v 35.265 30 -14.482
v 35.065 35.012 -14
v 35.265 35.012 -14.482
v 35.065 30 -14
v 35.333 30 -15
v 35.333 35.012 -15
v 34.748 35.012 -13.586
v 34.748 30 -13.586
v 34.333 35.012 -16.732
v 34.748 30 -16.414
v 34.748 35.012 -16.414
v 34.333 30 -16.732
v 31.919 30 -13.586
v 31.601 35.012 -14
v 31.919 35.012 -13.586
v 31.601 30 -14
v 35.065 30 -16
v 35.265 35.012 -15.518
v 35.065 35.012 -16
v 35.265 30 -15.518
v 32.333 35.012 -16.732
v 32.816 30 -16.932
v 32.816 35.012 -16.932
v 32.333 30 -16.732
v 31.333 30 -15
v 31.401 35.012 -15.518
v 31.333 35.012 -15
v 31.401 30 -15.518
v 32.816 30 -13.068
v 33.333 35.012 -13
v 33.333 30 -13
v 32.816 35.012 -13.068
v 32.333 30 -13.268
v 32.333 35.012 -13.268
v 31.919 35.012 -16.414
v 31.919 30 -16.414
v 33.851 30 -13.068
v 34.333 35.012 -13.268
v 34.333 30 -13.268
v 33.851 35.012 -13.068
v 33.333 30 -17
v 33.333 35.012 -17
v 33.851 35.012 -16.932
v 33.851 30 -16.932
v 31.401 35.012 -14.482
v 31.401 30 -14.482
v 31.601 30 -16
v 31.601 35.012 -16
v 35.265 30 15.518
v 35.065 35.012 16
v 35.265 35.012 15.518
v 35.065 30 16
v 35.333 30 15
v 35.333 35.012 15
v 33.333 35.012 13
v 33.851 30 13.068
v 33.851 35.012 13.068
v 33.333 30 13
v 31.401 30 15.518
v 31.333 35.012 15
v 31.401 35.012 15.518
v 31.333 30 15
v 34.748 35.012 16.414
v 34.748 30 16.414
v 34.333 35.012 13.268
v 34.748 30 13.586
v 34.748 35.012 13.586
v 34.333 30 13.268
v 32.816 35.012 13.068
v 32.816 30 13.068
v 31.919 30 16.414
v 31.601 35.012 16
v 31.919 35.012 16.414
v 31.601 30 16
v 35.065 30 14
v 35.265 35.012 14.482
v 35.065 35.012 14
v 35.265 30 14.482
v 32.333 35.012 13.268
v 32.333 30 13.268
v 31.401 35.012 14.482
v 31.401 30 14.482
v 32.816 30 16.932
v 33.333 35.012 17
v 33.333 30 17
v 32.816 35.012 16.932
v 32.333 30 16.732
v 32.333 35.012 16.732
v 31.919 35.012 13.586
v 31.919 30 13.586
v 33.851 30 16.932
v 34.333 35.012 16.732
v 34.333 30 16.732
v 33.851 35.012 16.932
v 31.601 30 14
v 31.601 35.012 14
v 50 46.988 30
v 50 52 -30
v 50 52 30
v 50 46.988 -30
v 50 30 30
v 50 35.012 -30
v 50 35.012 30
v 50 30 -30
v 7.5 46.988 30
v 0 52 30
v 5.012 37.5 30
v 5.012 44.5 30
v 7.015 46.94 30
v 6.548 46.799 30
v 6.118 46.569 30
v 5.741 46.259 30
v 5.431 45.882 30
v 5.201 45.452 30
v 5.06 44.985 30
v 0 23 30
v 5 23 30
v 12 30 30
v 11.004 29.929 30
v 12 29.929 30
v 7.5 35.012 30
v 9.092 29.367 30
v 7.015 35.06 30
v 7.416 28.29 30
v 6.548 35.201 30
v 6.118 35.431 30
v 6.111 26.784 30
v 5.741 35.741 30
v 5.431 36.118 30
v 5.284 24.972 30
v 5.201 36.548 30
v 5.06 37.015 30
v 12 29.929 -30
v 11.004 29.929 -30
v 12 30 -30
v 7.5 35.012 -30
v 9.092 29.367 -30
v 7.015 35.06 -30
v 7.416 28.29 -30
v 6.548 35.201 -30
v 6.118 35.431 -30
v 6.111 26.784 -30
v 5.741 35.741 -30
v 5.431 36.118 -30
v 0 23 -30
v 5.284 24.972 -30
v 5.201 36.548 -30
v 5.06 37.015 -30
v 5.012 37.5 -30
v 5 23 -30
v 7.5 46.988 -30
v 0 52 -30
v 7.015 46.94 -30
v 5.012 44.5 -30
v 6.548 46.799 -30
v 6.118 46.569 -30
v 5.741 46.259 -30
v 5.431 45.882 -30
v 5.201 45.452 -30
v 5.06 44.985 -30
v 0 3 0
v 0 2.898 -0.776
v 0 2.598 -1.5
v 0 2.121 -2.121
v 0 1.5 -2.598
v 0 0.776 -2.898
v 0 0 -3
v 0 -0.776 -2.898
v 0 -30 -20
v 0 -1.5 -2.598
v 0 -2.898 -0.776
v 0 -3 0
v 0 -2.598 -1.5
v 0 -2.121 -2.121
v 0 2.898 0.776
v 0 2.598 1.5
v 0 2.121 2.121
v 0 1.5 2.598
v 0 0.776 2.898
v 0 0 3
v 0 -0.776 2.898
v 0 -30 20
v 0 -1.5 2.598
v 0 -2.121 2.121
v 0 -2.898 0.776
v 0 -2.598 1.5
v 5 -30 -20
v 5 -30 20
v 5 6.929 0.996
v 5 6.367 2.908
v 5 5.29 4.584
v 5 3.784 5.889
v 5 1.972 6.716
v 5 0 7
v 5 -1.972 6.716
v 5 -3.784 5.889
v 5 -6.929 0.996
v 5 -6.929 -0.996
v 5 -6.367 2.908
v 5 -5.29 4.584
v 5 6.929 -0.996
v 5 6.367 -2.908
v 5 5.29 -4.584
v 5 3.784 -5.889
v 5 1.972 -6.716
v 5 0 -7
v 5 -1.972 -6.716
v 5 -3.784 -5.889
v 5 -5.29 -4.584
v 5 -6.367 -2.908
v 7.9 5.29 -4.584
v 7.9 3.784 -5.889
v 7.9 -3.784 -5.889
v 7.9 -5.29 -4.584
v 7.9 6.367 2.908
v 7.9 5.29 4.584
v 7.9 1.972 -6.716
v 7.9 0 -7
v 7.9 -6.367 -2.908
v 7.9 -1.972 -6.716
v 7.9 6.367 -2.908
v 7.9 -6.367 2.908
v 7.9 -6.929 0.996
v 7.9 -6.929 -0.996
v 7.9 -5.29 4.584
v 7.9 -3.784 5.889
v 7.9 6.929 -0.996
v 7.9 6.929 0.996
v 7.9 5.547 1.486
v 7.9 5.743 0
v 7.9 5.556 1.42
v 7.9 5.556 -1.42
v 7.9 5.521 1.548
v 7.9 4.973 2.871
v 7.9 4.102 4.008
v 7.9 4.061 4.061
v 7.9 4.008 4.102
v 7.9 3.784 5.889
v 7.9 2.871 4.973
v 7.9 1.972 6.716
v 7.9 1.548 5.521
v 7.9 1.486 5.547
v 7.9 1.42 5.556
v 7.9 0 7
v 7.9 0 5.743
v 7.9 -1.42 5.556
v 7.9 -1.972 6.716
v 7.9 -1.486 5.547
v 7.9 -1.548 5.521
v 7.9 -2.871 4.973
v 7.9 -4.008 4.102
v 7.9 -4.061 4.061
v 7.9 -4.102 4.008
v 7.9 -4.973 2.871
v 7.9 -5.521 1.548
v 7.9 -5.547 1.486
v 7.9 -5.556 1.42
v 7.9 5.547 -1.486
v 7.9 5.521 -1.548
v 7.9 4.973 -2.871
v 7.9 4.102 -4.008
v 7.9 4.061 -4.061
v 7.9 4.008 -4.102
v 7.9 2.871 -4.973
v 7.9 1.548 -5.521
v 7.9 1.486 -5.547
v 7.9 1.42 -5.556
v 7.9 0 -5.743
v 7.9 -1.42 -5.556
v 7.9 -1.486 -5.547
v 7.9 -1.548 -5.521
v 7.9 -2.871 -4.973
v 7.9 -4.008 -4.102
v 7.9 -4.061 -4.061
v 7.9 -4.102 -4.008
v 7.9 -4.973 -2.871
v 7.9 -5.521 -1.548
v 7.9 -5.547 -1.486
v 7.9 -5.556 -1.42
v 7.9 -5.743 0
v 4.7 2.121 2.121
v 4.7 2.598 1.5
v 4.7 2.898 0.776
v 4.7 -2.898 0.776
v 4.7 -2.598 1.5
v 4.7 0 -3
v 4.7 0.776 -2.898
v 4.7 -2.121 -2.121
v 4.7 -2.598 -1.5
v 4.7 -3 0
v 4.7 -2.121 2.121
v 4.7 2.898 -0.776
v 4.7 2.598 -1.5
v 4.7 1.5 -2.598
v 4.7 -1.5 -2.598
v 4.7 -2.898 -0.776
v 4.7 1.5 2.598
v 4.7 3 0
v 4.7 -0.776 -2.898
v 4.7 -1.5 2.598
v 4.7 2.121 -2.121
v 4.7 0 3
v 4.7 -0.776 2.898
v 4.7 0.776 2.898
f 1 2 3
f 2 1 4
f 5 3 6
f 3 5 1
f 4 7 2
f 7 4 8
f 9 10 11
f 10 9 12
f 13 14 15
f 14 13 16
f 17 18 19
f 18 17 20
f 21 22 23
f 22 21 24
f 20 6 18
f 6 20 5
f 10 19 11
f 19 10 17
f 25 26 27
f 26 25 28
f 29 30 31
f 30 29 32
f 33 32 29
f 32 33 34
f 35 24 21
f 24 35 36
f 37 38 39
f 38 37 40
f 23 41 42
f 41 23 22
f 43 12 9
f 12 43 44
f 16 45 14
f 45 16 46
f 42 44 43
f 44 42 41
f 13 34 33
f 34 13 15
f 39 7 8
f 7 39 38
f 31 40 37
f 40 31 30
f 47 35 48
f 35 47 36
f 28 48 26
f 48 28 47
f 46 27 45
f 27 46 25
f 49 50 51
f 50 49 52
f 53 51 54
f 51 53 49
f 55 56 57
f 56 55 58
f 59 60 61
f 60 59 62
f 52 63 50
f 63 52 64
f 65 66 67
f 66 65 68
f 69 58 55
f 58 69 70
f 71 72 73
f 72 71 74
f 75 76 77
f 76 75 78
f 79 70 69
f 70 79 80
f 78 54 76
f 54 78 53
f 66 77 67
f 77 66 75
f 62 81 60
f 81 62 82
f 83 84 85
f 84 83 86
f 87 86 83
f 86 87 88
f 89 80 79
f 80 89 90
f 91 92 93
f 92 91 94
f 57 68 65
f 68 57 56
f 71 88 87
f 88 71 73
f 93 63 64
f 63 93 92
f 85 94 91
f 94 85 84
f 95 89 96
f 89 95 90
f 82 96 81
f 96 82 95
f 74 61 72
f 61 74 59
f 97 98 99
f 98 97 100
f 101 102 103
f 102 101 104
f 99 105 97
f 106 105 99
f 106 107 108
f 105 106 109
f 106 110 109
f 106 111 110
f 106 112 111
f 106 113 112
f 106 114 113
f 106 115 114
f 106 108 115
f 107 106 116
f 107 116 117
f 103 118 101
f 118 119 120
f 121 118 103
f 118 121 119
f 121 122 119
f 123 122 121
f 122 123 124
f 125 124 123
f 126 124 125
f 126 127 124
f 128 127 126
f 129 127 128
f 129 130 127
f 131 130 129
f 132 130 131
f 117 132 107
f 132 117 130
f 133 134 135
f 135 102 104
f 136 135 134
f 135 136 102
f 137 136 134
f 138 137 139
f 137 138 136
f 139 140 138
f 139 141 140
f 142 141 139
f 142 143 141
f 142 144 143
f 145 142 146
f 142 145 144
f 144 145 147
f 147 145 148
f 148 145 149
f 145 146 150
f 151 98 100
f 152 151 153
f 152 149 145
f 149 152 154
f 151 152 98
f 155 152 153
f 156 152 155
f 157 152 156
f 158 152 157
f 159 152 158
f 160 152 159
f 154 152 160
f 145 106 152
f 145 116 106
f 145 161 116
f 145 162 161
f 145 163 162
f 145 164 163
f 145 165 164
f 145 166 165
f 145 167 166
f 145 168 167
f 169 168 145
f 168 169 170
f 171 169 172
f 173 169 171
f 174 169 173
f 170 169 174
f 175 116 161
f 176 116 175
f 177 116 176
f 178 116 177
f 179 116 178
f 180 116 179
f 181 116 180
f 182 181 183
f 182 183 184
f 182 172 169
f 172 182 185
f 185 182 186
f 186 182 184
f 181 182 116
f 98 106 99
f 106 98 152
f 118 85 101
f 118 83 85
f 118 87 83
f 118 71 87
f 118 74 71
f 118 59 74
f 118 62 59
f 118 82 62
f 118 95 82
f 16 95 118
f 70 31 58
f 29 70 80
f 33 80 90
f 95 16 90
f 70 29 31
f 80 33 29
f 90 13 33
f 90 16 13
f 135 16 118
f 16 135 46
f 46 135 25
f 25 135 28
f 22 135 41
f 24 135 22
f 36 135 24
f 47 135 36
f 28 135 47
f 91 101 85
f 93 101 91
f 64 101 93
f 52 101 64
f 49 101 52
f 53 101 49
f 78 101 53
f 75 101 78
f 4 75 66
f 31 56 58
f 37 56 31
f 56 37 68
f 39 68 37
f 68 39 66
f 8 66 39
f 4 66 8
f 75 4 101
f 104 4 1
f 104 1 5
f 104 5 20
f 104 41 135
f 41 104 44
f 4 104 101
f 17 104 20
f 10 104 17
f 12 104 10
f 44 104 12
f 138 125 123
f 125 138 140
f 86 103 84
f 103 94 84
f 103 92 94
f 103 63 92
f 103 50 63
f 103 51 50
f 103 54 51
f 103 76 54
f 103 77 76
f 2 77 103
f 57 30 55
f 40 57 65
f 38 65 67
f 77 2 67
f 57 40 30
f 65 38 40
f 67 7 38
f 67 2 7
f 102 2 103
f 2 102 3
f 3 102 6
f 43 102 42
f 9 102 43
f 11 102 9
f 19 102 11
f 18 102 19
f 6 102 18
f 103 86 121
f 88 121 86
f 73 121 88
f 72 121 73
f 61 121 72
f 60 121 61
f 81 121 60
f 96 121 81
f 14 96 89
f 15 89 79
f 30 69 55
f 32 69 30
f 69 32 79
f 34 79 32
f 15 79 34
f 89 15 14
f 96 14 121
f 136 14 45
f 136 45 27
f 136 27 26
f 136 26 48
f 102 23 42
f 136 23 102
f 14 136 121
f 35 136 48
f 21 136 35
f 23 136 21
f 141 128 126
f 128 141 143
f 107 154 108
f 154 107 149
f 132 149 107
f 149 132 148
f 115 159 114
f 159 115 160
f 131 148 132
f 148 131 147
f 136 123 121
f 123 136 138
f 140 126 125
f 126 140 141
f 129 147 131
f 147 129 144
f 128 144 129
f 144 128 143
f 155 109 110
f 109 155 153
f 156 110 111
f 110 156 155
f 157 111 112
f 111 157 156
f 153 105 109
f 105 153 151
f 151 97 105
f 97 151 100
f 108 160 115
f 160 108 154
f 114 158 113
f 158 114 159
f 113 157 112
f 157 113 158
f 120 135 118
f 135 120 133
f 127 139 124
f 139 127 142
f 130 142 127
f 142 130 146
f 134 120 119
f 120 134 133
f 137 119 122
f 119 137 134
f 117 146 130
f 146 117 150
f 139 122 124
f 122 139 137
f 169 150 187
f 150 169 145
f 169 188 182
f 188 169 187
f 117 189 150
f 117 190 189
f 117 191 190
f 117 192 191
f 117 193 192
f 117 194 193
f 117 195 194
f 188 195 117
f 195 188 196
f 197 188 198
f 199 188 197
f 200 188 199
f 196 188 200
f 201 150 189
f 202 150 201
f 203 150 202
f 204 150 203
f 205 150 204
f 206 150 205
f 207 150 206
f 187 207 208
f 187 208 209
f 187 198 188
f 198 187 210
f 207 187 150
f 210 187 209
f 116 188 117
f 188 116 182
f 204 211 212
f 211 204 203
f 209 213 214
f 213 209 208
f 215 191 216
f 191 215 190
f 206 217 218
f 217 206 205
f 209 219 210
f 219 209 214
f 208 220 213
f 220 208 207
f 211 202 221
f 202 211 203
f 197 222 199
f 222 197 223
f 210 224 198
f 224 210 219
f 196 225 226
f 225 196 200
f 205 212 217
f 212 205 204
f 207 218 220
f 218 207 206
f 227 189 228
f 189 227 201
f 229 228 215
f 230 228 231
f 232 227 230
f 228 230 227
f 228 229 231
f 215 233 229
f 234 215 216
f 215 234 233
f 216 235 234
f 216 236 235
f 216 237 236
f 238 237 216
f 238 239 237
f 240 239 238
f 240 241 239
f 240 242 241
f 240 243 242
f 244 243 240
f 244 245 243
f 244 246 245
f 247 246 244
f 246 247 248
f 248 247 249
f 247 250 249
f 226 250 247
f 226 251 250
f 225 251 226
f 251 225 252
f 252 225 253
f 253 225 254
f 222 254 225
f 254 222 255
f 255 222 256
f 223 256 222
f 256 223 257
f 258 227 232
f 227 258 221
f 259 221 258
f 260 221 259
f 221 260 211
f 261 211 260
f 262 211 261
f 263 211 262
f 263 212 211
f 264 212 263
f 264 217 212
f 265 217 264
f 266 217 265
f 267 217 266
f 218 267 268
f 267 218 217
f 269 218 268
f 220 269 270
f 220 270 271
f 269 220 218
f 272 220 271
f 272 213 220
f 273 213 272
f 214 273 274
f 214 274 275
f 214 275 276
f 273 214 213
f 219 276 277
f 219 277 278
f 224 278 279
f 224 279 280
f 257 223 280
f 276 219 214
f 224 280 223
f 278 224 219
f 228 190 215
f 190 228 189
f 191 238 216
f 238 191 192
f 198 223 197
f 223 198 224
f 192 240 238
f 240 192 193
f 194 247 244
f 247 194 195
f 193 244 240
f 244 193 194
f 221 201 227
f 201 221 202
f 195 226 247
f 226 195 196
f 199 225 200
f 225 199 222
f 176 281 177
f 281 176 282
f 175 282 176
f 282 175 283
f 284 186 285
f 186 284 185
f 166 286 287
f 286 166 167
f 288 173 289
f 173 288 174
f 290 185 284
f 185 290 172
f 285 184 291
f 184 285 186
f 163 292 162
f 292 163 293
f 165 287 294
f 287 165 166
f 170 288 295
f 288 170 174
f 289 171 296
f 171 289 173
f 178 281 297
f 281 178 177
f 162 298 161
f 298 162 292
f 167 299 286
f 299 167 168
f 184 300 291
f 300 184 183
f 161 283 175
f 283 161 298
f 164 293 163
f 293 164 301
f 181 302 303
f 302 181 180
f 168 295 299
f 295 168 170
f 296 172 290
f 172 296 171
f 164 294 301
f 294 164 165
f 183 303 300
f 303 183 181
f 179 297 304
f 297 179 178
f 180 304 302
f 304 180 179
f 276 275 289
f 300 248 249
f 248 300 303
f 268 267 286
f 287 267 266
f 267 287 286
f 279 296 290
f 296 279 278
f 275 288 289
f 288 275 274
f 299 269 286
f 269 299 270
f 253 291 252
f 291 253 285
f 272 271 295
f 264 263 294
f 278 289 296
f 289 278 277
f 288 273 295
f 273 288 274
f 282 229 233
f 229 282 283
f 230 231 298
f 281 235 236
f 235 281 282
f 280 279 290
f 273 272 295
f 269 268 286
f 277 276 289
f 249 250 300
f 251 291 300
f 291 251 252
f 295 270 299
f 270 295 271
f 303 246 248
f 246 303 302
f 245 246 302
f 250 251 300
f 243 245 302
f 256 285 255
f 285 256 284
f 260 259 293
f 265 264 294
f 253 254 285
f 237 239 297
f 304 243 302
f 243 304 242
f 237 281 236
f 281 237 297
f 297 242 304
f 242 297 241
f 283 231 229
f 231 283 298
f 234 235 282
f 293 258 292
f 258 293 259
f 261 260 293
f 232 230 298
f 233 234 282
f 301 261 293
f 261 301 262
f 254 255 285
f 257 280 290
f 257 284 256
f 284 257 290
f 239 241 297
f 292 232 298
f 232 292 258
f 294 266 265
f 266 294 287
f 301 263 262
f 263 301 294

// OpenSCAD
/*  EasyShelves. Wall mount Generator. Enables users of the Moidules/EasyShelves
    modules to create a customized wall mount bracket. The design is simple in order to be easilly printable.
    EasyShelves is Not Moidules.
    Copyright (C) 2015  PMorel for Thilab (www.thilab.fr)

    This program is free software: you can redistribute it and/or modify
    it under the terms of the GNU General Public License as published by
    the Free Software Foundation, either version 3 of the License, or
    (at your option) any later version.

    This program is distributed in the hope that it will be useful,
    but WITHOUT ANY WARRANTY; without even the implied warranty of
    MERCHANTABILITY or FITNESS FOR A PARTICULAR PURPOSE.  See the
    GNU General Public License for more details.

    You should have received a copy of the GNU General Public License
    along with this program.  If not, see <http://www.gnu.org/licenses/>.
*/

//Thickness of the walls
wall_thickness=5;
// Height of the piece that supports the polehanger
support_height=60;
// Width of the support at the top near the bracket
support_width_top=60;
// Width of the support at the bottom
support_width_bottom=40;
//Thickness of the wood
wood_thickness=12;
//Depth of the bracket
depth=50;
//Bracket Screws
number_of_screws = 2; //[0,1,2]
//Screw diameter
bracket_screw_diameter = 4; //[1:12]
//Top screws
top_screws = "no";
//Inner screws
inner_screws= "yes";
// Support screw position
support_screw_position = 0;
// Support screw diameter
support_screw_diameter = 6;
//countersunk height
countersunk_height = 3;

/* [Hidden] */
// The height of the bracket
hCube = wood_thickness+2*wall_thickness;
// length of the bracket 
front_side_length = support_width_top;
//Fillet of the pole hanger
fillet_size = 5;
//Fillet inside the bracket
board_fillet_size=0.5;
//Fillet between the bracket and the support
link_fillet=7;
//countersunk diameter
countersunk_diameter=support_screw_diameter*2+2;

//Main module
wallMount();


// This module creates the complete wall mount bracket. 
module wallMount() {
    difference() {
       union() {
            //The main piece
            translate([0,support_height/2-link_fillet,-support_width_top/2]) rotate([90,-90,90]) trapezoid(support_width_top, support_width_bottom, support_height-link_fillet,wall_thickness);
            // Create the bracket
            translate([0,support_height/2,-support_width_top/2]) 
                difference() {
                    bracket(inner_screws,top_screws,0);
                    translate([wall_thickness,wall_thickness,0]) 
                        boardH(0);
                }
            // Create the fillet between the bracket and the support
            translate([0,support_height/2-link_fillet,-support_width_top/2]) {
                difference() {
                    cube([link_fillet+wall_thickness,link_fillet,support_width_top]);
                    translate([link_fillet+wall_thickness,0,-0.1]) cylinder(r=link_fillet, h=support_width_top+1);
                }
            }
            // Countersunck hole
            translate([wall_thickness-0.1,support_screw_position,0]) rotate([0,90,0]) cylinder(r=countersunk_diameter/2, h=countersunk_height);
            
        }
        union() {
        // Support screw hole
        translate([-0.1,support_screw_position,0]) rotate([0,90,0]) cylinder($fn=24, r=support_screw_diameter/2, h=countersunk_height+wall_thickness+0.2);
        translate([wall_thickness-0.3,support_screw_position,0]) rotate([0,90,0]) cylinder($fn=24, r1=support_screw_diameter/2, h=countersunk_height+0.5, r2=countersunk_diameter/2-1);
        }
    }
}


// Create a trapezoid
module trapezoid(width_base, width_top,height,thickness) {
    linear_extrude(height = thickness) polygon(points=[[0,0],[width_base,0],[width_base-(width_base-width_top)/2,height],[(width_base-width_top)/2,height]], paths=[[0,1,2,3]]);
}

module boardH( shift ) {
    sphere_radius = board_fillet_size*wall_thickness;
    board_cube_thickness = wood_thickness-sphere_radius*2;
    translate([sphere_radius,sphere_radius,0])
        minkowski() {
            sphere($fn=32, r=sphere_radius);
            cube([depth, board_cube_thickness, front_side_length]);
            }
}

// Draw the bracket shape
module bracket( left_screws, right_screws, shift) {
        rotate([0,0,0]) {
            difference() {
                cube([depth,hCube,front_side_length]);
                
                //Draw the left screws
                if( left_screws == "yes" ) {
                    width = wall_thickness;
                    height = front_side_length;
                    if( number_of_screws == 1 ) { 
                      translate([depth*2/3,wall_thickness+0.1,front_side_length/2]) rotate([90,0,0]) cylinder($fn=24, r=bracket_screw_diameter/2, h=width+2);                
                    } else if(number_of_screws == 2) {
                      translate([depth*2/3,wall_thickness+0.1,front_side_length/4]) rotate([90,0,0]) cylinder($fn=24, r=bracket_screw_diameter/2, h=width+2);                
                      translate([depth*2/3,wall_thickness+0.1,front_side_length*3/4]) rotate([90,0,0]) cylinder($fn=24, r=bracket_screw_diameter/2, h=width+2);             
                    }
                }
                //Draw the right screws
                if( right_screws == "yes" ) {
                    width = wall_thickness;
                    screw_shift = wall_thickness*2 + wood_thickness + 1;
                    height = front_side_length;
                    if( number_of_screws == 1 ) { 
                      translate([depth*2/3,screw_shift+0.1,front_side_length/2]) rotate([90,0,0]) cylinder($fn=24, r=bracket_screw_diameter/2, h=width+2);                
                    } else if(number_of_screws == 2) {
                      translate([depth*2/3,screw_shift+0.1,front_side_length/4]) rotate([90,0,0]) cylinder($fn=24, r=bracket_screw_diameter/2, h=width+2);                
                      translate([depth*2/3,screw_shift+0.1,front_side_length*3/4]) rotate([90,0,0]) cylinder($fn=24, r=bracket_screw_diameter/2, h=width+2);             
                    }
                }
           }
       }
}
